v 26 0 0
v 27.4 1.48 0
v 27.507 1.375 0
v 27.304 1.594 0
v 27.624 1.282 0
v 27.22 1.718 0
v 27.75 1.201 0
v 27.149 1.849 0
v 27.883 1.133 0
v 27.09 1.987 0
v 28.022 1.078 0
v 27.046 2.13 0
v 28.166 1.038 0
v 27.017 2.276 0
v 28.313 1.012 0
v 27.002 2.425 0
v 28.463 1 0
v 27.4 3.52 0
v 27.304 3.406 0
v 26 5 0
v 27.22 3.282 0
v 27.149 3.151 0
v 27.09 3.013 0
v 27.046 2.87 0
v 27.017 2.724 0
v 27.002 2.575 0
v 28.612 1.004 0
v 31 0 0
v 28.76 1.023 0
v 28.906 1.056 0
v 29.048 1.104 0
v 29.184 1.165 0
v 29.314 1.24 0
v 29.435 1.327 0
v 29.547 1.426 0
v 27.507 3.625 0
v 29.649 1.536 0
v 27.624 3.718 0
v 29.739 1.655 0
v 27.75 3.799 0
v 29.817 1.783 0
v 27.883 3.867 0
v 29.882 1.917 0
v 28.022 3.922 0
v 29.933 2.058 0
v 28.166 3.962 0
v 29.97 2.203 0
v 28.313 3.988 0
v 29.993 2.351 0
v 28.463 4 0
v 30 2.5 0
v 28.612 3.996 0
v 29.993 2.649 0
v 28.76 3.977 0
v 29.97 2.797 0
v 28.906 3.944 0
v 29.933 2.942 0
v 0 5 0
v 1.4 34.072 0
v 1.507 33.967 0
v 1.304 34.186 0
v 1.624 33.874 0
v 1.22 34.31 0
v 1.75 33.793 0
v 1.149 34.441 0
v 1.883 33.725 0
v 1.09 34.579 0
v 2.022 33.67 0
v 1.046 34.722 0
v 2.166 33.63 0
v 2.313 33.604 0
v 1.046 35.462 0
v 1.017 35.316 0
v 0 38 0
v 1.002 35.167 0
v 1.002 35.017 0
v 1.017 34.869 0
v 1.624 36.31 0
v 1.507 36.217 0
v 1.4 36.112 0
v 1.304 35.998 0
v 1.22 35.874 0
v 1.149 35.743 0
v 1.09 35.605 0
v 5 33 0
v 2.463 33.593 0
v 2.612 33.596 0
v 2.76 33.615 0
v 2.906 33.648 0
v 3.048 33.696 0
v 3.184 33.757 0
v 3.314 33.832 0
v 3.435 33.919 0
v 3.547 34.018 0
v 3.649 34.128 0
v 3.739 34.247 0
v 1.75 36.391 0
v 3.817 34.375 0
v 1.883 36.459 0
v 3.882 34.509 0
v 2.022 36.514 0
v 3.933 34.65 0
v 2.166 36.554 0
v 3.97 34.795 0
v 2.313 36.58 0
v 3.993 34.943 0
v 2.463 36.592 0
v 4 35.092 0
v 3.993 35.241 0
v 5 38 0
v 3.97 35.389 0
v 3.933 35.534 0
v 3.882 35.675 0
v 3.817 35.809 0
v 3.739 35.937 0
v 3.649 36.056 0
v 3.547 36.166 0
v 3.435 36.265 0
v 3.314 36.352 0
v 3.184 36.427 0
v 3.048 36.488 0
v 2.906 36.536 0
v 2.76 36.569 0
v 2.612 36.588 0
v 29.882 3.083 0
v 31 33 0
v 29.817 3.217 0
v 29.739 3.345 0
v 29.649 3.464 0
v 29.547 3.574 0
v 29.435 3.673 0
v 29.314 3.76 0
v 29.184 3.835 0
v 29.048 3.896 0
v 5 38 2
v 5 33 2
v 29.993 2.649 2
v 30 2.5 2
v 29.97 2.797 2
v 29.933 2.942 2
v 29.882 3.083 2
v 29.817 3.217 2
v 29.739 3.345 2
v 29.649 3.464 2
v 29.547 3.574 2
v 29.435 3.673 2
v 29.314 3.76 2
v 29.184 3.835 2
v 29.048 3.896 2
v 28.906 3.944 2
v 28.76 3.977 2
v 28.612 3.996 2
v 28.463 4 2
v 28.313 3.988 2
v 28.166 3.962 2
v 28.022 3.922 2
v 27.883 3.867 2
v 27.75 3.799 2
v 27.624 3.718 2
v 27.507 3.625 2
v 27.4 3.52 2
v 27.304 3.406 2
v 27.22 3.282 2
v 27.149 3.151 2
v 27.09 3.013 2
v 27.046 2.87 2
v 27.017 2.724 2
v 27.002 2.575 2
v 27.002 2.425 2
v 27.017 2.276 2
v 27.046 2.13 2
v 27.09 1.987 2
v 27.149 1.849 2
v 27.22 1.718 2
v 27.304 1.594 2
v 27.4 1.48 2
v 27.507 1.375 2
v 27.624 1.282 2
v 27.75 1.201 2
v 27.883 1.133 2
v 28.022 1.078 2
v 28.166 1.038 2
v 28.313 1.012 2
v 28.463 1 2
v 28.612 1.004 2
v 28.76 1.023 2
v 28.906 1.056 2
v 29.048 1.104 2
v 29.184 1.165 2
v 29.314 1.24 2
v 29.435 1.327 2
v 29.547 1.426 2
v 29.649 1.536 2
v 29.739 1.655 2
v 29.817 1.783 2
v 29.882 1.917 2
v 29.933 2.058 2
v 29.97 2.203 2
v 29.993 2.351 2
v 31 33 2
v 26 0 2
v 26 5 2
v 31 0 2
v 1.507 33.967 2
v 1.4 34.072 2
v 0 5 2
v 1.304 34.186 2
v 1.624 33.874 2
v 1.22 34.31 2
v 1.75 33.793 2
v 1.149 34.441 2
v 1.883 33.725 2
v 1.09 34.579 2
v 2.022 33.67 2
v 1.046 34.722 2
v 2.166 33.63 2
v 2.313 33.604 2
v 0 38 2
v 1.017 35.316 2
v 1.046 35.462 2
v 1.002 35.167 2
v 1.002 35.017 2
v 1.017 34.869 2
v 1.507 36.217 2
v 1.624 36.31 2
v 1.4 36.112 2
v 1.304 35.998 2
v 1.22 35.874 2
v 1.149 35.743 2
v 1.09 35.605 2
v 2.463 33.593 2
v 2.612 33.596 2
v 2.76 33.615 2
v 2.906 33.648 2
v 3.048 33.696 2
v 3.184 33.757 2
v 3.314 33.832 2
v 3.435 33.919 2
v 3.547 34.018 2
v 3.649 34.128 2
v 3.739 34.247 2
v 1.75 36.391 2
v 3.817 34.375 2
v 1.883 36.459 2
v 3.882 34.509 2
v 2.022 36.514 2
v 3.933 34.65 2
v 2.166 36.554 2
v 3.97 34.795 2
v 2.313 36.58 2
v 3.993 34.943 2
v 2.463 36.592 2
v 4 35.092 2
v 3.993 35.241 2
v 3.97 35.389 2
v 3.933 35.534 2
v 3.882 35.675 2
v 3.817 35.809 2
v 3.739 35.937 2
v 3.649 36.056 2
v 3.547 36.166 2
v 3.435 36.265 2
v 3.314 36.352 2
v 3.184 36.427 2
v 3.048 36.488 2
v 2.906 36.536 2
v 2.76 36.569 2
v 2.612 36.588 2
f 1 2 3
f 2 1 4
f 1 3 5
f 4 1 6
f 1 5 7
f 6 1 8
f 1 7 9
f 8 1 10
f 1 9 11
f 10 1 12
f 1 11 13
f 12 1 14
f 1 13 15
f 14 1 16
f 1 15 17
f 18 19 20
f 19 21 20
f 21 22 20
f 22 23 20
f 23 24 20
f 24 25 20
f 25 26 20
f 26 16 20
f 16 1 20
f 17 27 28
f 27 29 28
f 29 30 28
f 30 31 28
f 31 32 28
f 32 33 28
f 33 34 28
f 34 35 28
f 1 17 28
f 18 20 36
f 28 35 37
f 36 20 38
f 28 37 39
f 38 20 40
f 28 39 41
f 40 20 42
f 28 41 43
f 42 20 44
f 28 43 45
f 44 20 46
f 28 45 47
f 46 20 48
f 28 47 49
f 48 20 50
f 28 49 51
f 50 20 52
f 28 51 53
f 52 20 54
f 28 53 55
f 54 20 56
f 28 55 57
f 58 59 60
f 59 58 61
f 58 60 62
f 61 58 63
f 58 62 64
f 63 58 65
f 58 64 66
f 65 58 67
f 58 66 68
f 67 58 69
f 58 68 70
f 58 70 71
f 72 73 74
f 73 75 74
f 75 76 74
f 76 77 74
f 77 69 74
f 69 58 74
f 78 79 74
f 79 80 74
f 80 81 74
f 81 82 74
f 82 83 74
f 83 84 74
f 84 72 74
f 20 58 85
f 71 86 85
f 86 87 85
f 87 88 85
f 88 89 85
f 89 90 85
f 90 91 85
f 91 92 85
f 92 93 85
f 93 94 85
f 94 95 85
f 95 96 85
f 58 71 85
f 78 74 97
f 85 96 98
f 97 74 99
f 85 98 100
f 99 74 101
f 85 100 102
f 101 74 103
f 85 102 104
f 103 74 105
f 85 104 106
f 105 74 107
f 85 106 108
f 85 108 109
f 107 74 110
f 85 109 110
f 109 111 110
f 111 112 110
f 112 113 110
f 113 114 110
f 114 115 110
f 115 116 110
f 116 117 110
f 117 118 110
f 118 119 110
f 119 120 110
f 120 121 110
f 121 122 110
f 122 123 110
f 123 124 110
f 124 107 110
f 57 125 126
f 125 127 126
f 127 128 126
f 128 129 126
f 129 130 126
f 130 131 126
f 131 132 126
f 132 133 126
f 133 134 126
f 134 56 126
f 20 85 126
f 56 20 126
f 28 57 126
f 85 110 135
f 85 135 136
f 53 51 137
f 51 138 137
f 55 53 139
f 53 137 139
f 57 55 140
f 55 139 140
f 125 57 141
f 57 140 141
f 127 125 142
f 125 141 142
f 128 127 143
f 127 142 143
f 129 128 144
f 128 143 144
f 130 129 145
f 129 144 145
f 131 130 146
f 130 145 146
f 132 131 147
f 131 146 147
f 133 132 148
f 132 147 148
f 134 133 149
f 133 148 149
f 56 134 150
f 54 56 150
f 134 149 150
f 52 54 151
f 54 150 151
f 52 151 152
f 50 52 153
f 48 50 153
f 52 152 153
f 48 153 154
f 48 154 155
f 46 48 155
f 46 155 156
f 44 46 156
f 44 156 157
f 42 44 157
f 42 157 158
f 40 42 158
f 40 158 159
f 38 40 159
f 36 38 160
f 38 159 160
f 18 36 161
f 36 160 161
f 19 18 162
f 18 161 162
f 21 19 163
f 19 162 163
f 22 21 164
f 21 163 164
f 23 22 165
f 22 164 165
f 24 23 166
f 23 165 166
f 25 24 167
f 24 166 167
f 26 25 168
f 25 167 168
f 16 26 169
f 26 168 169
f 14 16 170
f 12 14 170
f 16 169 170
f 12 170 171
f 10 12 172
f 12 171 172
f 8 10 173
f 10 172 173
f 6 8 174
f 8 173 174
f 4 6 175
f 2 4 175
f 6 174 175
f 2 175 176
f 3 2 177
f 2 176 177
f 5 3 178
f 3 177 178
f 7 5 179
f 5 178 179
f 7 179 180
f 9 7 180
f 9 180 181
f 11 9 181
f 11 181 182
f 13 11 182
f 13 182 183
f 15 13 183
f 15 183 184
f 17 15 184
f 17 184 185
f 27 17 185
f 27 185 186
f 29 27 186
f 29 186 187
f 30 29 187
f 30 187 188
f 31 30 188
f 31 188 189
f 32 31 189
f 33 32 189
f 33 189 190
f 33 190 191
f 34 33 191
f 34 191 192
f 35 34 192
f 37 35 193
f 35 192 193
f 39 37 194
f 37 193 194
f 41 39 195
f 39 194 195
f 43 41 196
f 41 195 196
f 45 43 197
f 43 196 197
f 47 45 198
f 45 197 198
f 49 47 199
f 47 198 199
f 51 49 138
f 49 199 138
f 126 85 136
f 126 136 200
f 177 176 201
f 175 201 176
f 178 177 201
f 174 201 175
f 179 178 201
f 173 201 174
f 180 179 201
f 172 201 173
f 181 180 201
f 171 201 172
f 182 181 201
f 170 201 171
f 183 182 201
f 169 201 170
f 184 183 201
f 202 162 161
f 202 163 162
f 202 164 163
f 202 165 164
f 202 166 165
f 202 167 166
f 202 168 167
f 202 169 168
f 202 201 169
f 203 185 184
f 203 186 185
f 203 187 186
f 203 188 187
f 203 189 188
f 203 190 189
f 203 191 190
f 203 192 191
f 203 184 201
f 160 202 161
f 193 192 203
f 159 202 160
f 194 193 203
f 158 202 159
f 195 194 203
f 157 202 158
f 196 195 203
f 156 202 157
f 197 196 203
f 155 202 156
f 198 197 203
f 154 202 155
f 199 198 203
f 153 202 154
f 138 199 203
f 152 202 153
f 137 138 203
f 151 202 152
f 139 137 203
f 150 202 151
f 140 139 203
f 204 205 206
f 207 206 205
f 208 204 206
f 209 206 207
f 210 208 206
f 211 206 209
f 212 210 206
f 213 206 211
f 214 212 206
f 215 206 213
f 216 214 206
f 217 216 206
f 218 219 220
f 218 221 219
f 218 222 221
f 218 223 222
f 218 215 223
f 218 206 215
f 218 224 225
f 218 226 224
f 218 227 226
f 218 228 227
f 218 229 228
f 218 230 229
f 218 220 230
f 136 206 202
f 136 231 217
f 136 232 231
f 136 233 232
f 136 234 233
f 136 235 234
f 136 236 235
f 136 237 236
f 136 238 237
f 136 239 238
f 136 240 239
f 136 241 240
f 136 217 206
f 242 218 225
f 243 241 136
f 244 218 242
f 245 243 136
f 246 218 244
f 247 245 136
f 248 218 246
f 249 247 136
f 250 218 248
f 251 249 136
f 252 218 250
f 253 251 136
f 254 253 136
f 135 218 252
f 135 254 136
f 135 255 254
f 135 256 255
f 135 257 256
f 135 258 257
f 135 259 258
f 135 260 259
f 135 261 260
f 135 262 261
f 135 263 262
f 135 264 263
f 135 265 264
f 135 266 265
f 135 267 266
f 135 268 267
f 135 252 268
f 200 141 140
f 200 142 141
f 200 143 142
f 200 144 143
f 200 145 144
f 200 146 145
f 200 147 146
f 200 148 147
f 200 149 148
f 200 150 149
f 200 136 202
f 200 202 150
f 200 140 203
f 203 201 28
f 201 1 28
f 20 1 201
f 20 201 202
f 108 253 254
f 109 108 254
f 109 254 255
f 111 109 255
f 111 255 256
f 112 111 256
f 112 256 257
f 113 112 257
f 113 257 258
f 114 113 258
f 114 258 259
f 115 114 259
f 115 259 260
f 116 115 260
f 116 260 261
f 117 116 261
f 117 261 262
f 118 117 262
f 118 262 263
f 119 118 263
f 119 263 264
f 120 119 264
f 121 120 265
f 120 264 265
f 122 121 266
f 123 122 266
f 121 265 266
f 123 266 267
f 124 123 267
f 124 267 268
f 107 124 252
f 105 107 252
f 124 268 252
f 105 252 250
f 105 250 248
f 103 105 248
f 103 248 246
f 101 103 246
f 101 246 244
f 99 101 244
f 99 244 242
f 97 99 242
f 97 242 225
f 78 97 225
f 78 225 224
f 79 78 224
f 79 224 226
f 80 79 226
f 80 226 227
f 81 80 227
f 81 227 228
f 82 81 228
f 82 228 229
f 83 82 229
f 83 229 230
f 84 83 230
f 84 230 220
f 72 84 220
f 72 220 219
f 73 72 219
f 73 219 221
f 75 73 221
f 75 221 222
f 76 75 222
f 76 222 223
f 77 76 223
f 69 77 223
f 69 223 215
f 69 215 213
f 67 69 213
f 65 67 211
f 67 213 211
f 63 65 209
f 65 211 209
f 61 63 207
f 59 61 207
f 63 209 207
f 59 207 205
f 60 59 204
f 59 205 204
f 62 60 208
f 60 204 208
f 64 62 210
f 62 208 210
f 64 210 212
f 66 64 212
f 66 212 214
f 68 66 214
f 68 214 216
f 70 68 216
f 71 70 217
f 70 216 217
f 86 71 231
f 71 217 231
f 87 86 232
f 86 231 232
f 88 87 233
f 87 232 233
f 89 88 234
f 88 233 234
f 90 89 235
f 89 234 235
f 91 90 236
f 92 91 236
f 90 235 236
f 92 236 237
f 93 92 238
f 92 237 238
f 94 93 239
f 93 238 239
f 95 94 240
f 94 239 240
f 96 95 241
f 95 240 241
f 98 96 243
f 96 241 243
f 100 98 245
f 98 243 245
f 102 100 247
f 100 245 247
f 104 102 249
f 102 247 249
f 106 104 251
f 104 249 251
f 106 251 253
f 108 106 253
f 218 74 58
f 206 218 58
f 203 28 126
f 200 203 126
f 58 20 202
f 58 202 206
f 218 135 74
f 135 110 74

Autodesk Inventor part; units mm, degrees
ref_plane "YZ Plane" through (0, 0, 0) normal (1, 0, 0) x (0, 1, 0)
ref_plane "XZ Plane" through (0, 0, 0) normal (0, 1, 0) x (-1, 0, 0)
ref_plane "XY Plane" through (0, 0, 0) normal (0, 0, 1) x (1, 0, 0)
sketch "Sketch1" plane through (0, 0, 0) normal (0, 0, 1) x (1, 0, 0)
  line L0 (0, 0) -> (31, 0)
  line L1 (31, 0) -> (31, 38)
  line L2 (31, 38) -> (0, 38)
  line L3 (0, 38) -> (0, 0)
  line L4 (31, 38) -> (5, 38)
  line L5 (5, 38) -> (5, 33)
  line L6 (5, 33) -> (31, 33)
  line L7 (31, 33) -> (31, 38)
  line L8 (0, 0) -> (26, 0)
  line L9 (26, 0) -> (26, 5)
  line L10 (26, 5) -> (0, 5)
  line L11 (0, 5) -> (0, 0)
  dimension "d0" = 31
  dimension "d1" = 38
  dimension "d3" = 5
  dimension "d4" = 5
  dimension "d5" = 5
  dimension "d6" = 5
extrude "Extrusion1" add sketch "Sketch1" along normal blind 2 contours L9 L10 L3 L2 L5 L6 L1 L0
sketch "Sketch2" plane through (0, 0, 2) normal (0, 0, 1) x (1, 0, 0)
  line L0 (26, 5) -> (26, 0) projected
  line L1 (26, 0) -> (31, 0) projected
  line L2 (31, 0) -> (31, 33) projected
  line L3 (31, 33) -> (5, 33) projected
  line L4 (5, 33) -> (5, 38) projected
  line L5 (5, 38) -> (0, 38) projected
  line L6 (0, 38) -> (0, 5) projected
  line L7 (0, 5) -> (26, 5) projected
  circle A0 centre (2.5, 35.0921) radius 1.5
  circle A1 centre (28.5, 2.5) radius 1.5
  point P0 (0, 0)
  dimension "d9" = 3
  dimension "d10" = 3
extrude "Extrusion2" cut sketch "Sketch2" against normal blind 2 contours A0 | A1
properties part number "00_cellstorm_Amplifier"
